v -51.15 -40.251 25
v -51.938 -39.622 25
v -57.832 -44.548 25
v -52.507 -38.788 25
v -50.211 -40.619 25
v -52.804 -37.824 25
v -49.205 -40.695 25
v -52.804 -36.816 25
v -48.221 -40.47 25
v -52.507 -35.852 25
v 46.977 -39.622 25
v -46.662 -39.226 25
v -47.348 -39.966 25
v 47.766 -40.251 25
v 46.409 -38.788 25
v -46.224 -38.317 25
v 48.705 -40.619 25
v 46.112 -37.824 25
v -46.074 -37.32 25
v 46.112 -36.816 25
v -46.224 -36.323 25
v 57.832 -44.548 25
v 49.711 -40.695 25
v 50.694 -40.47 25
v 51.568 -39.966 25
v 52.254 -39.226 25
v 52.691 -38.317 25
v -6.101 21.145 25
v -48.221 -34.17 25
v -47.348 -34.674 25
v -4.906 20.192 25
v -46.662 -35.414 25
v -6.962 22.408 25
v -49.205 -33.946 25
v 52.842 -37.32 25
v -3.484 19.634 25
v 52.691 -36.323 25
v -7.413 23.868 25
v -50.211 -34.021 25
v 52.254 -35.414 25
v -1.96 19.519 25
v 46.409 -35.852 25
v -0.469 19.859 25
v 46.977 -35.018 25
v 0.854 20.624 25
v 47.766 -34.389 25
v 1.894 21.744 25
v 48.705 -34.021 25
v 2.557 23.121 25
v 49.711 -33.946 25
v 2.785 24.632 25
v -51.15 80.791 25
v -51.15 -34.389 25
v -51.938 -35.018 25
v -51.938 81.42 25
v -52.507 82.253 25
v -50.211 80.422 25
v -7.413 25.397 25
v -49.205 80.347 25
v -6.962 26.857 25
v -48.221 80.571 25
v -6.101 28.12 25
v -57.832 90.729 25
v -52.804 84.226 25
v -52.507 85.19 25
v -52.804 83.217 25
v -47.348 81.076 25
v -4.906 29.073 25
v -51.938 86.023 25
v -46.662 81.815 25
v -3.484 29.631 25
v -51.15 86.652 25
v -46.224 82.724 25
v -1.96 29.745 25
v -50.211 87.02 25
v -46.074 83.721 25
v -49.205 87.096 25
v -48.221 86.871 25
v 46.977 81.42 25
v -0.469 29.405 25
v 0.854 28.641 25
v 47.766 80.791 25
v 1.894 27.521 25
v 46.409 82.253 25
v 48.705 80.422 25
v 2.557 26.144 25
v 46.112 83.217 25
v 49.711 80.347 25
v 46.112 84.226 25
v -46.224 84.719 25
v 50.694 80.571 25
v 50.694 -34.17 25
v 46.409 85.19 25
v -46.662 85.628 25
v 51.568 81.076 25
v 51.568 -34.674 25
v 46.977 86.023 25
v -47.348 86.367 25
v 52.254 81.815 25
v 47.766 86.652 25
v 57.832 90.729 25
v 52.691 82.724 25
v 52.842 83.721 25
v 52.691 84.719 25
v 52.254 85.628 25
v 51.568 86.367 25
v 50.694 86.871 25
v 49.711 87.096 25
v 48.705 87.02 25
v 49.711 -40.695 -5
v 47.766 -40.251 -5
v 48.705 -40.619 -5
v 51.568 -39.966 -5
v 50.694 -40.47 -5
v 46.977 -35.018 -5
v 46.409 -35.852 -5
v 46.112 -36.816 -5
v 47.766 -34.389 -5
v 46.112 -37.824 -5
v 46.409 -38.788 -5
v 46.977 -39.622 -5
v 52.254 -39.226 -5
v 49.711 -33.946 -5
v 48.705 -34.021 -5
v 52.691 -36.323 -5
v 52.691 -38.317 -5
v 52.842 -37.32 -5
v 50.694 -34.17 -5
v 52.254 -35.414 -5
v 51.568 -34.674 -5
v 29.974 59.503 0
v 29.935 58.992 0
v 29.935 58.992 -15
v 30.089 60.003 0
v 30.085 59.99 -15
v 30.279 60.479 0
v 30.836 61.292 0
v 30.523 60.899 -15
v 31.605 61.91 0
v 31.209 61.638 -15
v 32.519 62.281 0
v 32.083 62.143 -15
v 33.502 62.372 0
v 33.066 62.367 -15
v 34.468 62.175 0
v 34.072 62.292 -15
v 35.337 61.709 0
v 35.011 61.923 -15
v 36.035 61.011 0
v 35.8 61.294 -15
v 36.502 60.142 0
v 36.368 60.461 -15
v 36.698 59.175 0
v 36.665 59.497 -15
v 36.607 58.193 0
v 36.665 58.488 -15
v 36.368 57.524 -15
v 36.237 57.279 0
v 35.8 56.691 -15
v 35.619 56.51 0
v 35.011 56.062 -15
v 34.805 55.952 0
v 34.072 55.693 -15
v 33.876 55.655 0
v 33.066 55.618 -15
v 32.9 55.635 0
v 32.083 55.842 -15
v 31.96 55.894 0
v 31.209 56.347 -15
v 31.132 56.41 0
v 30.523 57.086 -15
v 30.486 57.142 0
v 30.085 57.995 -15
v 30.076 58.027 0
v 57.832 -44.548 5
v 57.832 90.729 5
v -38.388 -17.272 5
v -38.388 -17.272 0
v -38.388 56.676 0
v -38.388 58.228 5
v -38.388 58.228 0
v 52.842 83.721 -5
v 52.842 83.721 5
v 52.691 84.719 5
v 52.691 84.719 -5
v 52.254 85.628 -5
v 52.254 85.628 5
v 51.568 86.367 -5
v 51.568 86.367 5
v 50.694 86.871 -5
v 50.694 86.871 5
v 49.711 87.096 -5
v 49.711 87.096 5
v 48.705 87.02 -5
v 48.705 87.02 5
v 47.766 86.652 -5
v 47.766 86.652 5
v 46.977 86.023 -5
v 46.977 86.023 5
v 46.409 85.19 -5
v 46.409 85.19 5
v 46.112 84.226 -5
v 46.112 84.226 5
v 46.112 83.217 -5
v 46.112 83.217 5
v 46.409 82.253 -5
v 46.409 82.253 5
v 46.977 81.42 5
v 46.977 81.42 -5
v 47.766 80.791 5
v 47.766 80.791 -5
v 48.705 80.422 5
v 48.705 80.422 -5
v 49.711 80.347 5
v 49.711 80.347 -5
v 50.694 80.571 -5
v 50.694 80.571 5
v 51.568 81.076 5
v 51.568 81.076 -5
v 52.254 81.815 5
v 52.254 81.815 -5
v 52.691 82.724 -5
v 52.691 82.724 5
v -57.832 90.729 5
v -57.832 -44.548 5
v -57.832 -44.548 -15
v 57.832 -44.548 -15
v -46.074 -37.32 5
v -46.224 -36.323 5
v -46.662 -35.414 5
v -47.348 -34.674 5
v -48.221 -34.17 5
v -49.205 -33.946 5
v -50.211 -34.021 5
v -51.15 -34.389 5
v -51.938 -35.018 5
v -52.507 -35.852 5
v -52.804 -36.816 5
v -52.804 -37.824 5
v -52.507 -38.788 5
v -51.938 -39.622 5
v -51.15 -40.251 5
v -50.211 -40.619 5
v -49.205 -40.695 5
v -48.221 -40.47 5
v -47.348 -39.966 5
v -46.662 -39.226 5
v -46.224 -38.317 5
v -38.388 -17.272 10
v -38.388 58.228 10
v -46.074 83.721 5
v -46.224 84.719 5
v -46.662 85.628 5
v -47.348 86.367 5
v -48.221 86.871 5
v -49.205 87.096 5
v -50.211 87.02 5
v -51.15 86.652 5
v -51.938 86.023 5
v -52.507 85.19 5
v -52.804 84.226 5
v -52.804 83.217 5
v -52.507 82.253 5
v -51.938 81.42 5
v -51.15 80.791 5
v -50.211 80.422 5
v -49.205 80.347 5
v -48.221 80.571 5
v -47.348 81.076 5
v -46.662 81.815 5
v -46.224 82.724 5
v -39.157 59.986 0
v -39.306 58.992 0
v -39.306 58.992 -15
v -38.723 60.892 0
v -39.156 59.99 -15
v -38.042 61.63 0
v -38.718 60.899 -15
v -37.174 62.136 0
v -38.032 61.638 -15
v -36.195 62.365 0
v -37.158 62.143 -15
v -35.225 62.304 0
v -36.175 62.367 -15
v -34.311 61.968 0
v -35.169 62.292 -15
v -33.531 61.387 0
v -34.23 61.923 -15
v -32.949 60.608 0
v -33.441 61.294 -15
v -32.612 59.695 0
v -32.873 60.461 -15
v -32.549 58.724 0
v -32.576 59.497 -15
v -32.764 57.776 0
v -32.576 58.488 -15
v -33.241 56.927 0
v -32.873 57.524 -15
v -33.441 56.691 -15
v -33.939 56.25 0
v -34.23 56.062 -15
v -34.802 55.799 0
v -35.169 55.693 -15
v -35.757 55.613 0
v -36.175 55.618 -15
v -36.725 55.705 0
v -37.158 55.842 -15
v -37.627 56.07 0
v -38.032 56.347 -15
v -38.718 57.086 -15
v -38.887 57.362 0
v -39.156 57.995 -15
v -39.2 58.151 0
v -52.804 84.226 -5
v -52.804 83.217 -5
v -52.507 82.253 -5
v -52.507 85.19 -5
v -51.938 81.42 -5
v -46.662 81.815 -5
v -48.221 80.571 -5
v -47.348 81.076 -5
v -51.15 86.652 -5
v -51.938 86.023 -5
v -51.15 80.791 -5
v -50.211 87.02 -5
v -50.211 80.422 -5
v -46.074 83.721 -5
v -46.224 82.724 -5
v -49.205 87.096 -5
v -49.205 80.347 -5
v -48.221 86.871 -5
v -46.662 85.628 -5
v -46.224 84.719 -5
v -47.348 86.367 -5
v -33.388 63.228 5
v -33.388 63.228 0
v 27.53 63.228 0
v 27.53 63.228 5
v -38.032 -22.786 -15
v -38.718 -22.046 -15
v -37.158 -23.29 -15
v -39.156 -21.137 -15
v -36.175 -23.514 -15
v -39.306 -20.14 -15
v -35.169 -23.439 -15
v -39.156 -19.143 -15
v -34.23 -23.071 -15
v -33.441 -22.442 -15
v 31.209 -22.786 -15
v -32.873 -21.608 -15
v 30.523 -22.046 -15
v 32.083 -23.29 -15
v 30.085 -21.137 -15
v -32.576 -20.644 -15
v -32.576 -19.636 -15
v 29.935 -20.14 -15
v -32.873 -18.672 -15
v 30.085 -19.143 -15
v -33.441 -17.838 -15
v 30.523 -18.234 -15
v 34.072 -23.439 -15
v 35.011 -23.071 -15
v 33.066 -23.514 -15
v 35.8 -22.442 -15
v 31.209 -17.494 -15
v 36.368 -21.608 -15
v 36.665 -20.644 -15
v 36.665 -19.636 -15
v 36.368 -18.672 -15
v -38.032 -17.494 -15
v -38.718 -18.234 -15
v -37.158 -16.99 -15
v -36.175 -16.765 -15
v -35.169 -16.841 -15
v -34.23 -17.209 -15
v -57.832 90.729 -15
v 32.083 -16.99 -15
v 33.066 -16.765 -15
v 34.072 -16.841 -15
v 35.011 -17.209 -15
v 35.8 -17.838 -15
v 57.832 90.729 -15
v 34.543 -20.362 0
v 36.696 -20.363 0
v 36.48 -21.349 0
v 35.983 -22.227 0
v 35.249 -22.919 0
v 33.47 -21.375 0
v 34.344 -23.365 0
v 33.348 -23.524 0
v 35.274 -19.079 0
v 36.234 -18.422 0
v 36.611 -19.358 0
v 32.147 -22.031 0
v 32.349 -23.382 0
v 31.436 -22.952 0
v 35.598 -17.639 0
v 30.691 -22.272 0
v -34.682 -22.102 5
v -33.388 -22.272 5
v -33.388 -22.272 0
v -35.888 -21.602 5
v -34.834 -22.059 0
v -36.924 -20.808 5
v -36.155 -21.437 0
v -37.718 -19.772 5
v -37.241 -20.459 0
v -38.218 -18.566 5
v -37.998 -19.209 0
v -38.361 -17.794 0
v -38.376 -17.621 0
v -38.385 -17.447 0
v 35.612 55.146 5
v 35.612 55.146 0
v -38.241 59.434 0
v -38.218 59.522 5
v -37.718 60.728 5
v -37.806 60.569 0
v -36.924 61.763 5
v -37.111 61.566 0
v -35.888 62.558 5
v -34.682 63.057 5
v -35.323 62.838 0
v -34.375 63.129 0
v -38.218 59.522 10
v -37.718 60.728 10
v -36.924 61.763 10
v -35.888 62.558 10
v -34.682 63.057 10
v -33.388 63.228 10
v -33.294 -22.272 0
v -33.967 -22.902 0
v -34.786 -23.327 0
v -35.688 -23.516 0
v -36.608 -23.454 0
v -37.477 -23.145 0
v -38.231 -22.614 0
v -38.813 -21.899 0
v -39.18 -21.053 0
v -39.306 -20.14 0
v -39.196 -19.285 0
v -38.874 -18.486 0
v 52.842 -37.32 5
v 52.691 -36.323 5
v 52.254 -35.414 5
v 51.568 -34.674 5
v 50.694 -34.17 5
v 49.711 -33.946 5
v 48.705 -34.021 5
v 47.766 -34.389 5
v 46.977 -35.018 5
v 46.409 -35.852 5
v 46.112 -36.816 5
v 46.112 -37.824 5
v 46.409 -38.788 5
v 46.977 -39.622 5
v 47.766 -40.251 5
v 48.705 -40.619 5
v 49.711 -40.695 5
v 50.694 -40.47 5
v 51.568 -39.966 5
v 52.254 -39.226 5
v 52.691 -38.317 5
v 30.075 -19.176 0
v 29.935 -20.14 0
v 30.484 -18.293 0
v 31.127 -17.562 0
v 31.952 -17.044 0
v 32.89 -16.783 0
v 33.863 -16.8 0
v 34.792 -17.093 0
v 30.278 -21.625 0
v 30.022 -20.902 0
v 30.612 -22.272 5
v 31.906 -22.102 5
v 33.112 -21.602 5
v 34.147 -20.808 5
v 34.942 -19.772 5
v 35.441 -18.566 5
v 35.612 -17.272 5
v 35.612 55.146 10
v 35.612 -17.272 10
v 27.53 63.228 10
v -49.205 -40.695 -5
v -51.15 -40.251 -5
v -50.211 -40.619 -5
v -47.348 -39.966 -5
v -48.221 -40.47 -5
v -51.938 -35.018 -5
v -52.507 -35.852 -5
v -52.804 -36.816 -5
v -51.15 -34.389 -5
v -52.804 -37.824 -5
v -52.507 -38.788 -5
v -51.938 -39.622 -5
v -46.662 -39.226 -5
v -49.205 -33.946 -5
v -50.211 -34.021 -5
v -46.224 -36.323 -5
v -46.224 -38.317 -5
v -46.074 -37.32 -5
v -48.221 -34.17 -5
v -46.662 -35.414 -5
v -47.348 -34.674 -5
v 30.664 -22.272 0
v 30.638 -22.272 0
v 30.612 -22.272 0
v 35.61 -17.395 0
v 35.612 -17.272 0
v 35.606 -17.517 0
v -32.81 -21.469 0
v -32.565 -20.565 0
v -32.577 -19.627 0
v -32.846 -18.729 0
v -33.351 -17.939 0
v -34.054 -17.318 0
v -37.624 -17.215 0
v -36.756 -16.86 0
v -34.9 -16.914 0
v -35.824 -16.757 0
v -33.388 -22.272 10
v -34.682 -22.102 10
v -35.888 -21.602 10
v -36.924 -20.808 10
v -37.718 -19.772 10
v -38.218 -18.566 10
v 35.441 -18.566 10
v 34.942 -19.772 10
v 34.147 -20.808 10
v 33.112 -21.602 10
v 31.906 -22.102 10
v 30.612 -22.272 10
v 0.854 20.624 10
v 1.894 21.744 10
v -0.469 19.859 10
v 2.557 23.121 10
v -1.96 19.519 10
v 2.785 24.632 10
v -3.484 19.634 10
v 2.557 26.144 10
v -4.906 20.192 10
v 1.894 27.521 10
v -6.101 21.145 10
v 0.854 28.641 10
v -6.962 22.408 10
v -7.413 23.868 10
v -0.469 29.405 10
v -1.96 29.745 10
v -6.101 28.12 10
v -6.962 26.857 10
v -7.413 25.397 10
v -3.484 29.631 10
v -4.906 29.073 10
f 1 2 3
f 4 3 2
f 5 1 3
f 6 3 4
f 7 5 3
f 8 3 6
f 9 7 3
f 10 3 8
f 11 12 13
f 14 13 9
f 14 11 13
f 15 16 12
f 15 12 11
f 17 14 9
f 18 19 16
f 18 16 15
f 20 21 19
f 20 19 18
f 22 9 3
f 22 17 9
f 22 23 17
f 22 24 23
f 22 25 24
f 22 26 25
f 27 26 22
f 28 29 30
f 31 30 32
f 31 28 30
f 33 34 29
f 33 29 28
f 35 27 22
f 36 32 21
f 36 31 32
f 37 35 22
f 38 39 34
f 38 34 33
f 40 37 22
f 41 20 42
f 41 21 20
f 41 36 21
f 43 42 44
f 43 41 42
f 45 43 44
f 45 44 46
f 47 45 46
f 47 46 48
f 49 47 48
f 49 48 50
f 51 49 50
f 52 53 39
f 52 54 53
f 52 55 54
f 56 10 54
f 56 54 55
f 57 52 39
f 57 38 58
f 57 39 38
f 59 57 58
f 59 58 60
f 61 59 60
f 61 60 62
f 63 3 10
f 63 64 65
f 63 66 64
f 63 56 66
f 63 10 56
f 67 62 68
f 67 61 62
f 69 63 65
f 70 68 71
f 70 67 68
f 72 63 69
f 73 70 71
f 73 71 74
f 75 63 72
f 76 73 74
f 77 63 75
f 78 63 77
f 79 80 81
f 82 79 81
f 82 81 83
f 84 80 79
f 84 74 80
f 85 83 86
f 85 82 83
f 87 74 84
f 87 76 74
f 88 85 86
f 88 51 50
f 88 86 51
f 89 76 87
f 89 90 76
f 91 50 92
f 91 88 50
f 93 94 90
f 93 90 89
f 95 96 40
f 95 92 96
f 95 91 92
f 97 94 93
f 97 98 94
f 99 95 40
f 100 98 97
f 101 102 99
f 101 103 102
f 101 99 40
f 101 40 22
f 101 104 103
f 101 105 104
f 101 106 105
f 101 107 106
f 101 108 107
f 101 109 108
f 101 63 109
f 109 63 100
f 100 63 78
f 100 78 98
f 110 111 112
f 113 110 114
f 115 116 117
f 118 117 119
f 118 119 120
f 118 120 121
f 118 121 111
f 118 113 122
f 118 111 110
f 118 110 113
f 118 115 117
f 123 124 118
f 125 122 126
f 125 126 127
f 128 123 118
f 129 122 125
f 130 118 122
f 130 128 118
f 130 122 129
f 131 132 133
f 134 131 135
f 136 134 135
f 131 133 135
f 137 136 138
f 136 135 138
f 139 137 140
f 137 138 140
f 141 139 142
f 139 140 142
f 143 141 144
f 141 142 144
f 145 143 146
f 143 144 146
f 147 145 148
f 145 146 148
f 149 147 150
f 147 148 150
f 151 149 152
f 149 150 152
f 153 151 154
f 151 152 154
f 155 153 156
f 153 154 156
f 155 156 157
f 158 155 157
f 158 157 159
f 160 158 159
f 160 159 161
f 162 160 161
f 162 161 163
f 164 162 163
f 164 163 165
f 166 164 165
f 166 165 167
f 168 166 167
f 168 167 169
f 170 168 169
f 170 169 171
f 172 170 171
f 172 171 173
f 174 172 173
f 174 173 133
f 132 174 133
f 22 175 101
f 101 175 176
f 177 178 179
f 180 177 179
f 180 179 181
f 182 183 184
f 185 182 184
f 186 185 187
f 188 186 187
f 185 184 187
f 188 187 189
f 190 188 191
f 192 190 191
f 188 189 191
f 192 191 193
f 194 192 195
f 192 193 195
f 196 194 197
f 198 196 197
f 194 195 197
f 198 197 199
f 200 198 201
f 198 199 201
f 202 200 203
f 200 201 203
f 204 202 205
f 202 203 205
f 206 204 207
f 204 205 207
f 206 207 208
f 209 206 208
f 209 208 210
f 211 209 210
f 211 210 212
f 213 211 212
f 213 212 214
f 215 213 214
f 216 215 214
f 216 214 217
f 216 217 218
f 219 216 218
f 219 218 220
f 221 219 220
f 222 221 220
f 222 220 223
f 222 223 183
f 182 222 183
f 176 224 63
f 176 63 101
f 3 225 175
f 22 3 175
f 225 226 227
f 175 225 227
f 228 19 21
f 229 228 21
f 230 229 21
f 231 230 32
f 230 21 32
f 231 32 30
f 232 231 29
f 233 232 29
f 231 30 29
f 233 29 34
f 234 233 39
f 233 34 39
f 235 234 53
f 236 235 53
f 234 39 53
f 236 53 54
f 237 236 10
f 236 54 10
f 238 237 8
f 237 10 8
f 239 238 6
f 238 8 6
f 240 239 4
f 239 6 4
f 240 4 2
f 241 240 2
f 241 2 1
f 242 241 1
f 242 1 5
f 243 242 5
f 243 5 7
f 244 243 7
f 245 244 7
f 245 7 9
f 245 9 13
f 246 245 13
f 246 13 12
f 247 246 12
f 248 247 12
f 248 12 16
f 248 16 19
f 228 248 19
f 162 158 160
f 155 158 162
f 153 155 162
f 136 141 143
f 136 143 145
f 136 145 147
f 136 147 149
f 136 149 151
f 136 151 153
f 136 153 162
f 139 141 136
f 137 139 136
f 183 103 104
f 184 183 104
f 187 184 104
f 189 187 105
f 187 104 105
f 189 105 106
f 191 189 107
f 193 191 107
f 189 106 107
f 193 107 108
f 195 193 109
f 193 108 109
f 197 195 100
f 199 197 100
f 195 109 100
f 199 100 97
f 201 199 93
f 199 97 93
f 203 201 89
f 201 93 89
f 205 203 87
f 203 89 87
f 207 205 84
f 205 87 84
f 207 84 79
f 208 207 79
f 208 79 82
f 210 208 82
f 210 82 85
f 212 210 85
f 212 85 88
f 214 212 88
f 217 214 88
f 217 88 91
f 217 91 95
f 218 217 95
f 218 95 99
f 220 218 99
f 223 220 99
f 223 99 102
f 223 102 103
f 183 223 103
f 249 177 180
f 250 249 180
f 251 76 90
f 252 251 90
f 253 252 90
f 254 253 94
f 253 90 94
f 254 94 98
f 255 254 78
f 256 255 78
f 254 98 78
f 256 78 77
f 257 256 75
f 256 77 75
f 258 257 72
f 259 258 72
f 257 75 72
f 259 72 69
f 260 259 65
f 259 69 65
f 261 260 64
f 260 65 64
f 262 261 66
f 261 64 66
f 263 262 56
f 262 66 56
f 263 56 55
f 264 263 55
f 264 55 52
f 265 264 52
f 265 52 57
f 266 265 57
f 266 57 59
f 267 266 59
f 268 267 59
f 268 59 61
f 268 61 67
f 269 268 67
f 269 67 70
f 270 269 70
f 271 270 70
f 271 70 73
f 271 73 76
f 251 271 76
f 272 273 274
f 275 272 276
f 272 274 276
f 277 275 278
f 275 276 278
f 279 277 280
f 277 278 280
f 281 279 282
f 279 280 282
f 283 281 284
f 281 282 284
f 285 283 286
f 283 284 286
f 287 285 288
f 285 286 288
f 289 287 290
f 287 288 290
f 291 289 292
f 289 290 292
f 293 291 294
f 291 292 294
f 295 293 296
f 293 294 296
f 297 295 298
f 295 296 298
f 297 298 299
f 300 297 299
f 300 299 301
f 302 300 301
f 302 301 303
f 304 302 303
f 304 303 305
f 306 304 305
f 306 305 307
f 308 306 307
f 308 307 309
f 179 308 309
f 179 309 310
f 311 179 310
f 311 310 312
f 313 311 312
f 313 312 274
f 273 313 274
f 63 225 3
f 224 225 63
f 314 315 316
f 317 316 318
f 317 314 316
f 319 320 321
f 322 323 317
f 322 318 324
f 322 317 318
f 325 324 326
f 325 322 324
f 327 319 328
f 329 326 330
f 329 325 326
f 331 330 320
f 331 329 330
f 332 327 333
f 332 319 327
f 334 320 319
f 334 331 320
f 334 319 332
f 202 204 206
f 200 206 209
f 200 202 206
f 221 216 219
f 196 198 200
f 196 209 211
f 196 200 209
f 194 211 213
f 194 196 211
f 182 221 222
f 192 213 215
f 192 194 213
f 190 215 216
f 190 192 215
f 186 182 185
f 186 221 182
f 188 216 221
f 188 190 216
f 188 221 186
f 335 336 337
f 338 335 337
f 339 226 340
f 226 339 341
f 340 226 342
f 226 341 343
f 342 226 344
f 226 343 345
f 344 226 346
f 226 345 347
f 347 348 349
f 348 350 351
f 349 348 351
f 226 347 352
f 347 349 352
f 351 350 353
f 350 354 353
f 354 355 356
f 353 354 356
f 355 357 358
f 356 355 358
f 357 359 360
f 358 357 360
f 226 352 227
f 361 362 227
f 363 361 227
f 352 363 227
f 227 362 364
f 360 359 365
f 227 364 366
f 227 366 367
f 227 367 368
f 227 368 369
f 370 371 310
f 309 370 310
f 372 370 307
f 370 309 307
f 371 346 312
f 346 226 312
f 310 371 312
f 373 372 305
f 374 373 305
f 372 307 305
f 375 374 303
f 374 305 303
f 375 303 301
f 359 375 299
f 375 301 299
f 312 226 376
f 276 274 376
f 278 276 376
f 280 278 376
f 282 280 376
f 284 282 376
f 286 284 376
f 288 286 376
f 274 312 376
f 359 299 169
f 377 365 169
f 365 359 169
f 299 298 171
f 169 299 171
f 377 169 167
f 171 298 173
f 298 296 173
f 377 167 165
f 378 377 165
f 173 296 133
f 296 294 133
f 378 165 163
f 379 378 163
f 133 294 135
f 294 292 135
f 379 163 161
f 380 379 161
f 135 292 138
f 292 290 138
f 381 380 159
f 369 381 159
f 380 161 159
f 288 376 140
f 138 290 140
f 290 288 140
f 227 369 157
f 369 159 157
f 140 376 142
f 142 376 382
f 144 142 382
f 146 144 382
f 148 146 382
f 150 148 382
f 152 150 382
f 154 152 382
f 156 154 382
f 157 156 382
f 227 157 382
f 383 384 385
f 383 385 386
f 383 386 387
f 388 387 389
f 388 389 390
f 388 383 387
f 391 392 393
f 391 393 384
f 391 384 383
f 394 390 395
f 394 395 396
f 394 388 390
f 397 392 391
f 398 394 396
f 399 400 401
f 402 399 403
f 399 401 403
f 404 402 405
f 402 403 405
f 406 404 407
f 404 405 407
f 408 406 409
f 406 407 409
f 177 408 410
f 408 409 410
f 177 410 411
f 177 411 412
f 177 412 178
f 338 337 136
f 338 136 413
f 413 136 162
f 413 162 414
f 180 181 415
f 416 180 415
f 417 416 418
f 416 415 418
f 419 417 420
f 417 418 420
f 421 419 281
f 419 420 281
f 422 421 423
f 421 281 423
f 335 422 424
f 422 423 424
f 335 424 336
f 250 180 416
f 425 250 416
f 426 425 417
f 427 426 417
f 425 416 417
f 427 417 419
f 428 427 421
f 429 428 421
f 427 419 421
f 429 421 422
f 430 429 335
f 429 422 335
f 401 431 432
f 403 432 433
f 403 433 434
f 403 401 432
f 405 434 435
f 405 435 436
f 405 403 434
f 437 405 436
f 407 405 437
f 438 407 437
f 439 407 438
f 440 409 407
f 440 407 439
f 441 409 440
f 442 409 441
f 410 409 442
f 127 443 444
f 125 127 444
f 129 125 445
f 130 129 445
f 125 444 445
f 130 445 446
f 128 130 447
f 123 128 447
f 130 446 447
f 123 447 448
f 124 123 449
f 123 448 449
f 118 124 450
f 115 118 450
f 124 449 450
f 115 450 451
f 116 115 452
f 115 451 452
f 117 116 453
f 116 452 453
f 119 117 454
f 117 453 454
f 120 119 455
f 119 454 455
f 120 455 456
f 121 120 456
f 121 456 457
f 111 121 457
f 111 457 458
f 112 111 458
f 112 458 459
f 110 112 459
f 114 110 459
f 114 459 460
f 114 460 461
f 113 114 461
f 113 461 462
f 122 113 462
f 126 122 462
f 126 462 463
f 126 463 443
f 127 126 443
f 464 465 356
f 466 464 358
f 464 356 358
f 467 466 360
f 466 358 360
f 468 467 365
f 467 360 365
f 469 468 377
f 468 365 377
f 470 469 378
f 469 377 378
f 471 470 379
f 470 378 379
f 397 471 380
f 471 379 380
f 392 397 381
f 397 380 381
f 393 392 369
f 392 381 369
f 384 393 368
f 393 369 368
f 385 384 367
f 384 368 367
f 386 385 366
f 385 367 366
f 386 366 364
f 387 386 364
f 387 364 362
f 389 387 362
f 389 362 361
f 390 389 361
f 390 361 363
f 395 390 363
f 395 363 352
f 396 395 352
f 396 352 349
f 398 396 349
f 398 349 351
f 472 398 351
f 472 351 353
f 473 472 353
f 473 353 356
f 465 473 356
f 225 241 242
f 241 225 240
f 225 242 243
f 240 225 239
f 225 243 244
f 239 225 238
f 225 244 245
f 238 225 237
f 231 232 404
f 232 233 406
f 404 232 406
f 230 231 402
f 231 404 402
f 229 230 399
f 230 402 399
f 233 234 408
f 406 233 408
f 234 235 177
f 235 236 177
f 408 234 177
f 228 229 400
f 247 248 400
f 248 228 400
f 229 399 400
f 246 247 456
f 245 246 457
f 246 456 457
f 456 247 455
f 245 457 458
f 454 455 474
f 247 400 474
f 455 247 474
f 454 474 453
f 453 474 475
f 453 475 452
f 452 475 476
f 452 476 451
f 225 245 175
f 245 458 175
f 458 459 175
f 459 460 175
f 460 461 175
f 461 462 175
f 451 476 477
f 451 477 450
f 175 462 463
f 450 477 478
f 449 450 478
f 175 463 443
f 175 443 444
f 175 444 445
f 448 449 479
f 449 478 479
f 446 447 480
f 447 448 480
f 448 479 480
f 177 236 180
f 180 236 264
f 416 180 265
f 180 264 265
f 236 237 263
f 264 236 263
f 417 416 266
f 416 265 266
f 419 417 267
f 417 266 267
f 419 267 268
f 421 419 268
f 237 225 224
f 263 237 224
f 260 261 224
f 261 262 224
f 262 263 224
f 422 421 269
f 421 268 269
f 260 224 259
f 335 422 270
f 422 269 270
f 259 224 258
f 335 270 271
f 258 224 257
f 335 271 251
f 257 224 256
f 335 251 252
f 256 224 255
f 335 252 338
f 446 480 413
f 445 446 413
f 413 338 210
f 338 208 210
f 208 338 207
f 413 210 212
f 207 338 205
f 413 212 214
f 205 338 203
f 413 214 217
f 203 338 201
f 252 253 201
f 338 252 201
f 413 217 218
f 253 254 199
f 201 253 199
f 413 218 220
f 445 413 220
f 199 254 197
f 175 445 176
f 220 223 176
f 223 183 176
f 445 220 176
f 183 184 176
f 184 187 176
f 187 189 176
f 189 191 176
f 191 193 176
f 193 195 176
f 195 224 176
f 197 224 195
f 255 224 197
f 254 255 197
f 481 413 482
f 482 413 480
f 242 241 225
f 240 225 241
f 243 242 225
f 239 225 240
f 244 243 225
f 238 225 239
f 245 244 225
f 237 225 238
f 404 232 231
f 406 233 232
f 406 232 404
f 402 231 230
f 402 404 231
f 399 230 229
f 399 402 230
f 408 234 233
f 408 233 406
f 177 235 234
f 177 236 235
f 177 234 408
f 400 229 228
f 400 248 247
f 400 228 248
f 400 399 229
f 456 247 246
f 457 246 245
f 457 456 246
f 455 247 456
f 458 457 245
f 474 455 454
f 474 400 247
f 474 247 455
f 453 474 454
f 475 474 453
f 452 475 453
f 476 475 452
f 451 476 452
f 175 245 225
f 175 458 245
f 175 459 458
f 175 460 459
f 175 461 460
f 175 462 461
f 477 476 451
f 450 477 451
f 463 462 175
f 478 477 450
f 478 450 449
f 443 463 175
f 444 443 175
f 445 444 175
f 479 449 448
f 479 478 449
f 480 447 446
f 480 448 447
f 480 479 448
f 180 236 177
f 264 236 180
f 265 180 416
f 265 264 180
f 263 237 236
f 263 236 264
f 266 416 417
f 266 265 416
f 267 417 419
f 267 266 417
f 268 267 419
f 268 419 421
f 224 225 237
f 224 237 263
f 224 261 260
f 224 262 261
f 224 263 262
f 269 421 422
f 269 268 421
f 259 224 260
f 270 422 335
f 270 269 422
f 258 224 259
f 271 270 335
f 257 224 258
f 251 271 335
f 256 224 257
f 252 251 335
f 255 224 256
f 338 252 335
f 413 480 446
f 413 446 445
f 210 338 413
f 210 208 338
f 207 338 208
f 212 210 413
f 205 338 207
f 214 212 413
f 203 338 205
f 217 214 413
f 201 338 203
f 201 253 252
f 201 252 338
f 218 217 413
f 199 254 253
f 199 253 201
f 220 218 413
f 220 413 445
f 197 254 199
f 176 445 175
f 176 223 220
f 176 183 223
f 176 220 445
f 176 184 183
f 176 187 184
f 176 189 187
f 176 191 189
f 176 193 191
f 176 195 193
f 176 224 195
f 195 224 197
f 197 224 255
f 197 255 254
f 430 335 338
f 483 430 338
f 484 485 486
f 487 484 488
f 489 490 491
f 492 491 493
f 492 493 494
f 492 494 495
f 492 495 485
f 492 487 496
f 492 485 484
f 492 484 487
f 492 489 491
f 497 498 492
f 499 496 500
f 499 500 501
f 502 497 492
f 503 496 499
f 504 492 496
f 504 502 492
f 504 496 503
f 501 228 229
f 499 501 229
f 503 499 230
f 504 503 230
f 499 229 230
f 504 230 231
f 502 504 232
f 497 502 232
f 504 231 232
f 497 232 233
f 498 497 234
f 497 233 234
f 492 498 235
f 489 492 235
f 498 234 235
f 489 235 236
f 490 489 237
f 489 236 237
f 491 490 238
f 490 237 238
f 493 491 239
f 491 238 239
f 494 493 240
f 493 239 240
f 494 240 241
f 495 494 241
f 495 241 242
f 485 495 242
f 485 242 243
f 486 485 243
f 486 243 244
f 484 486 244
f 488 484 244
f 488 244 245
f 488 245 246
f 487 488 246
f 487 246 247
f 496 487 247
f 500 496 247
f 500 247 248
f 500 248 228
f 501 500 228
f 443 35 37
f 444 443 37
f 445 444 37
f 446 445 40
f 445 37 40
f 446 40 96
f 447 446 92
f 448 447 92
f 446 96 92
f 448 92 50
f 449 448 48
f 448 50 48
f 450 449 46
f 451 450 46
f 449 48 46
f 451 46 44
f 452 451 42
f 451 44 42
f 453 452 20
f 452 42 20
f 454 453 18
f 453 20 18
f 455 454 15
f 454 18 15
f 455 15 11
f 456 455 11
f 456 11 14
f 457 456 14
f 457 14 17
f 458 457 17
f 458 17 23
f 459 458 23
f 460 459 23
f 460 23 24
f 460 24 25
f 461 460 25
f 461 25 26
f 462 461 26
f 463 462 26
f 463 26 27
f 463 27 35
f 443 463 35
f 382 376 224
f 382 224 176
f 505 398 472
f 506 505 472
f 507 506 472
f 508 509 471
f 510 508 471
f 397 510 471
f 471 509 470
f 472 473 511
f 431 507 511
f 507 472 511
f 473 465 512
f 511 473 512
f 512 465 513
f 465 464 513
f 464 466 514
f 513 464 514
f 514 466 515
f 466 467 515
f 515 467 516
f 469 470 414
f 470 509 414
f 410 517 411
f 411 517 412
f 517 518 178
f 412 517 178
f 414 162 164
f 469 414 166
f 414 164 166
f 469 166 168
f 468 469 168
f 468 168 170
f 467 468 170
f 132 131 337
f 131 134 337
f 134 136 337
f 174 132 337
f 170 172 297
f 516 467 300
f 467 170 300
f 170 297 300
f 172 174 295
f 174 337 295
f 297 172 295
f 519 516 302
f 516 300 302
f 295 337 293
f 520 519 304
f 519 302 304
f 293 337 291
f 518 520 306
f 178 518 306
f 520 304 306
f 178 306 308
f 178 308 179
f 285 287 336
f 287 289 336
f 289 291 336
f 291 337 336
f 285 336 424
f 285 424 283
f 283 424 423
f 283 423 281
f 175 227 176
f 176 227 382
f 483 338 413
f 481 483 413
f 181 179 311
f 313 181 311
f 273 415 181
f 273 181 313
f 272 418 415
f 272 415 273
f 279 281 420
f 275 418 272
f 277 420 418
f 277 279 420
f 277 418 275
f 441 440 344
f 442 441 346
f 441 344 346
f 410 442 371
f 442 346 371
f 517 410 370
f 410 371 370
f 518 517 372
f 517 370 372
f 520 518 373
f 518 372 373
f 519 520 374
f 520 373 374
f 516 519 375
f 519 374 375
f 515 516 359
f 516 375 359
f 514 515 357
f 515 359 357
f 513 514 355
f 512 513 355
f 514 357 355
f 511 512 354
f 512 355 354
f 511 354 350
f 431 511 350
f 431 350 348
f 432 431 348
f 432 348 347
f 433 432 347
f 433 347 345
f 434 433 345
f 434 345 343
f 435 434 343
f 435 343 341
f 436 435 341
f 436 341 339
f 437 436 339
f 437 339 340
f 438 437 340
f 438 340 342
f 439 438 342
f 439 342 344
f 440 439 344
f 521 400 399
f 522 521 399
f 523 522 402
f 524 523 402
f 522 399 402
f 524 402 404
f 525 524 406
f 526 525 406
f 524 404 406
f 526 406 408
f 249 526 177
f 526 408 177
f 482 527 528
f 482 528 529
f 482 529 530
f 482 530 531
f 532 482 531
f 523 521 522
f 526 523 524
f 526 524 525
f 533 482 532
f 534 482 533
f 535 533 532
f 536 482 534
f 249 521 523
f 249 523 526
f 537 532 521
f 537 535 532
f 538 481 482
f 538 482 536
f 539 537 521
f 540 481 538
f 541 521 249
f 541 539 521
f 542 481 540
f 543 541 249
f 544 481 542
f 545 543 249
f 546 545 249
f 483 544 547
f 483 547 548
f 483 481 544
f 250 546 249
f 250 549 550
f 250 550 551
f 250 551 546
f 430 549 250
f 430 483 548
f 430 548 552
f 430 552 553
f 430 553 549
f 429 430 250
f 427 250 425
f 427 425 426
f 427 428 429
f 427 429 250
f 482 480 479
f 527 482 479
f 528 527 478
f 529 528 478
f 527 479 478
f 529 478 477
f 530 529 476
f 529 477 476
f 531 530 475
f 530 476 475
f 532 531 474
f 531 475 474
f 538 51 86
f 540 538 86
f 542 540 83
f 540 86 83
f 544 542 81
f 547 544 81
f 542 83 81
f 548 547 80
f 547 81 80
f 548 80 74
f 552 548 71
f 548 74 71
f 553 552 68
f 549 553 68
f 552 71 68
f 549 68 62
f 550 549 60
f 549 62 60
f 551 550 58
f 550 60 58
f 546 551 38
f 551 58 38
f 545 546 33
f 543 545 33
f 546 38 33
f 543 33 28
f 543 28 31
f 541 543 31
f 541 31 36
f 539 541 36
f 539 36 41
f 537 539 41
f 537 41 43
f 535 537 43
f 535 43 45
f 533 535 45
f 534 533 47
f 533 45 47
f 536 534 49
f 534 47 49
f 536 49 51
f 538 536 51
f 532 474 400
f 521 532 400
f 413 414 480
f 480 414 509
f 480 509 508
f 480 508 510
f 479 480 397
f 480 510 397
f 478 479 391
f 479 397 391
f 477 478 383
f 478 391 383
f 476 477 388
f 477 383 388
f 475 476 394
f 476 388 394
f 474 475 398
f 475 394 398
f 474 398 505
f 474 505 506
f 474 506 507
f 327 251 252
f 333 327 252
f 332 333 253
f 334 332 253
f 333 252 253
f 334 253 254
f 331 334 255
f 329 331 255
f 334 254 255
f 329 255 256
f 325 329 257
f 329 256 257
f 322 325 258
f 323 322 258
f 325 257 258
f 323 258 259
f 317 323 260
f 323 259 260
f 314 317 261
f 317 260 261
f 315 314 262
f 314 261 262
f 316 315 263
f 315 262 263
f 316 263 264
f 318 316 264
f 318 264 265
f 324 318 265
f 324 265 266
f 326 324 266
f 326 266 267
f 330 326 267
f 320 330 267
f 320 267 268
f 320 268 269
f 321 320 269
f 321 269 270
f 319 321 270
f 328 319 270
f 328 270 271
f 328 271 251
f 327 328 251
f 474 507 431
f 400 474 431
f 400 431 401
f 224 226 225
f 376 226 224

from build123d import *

# Parameters (mm, degrees)
BOSS_EXTRU_1_DEPTH      = 10
BOSS_EXTRU_3_DEPTH      = 20
BOSS_EXTRU_3_DEPTH_BACK = 20
ESQUISSE3_W             = 115.663264596
ESQUISSE3_H             = 135.276956668
ESQUISSE4_R             = 3.383953379
ENL_V_MAT_EXTRU_1_DEPTH = 30
ESQUISSE5_R             = 5.127396252
ENL_V_MAT_EXTRU_2_DEPTH = 15
ESQUISSE6_R             = 3.383953379
ENL_V_MAT_EXTRU_3_DEPTH = 15


with BuildPart() as part:
    # Esquisse1 → Boss.-Extru.1 (new body)
    with BuildSketch(Plane.XY):
        with BuildLine():
            ThreePointArc((-33.388322981, -22.272236025), (-36.923856887, -20.807769931), (-38.388322981, -17.272236025))
            Line((-38.388322981, -17.272236025), (-38.388322981, 58.227763975))
            ThreePointArc((-38.388322981, 58.227763975), (-36.923856887, 61.763297881), (-33.388322981, 63.227763975))
            Line((-33.388322981, 63.227763975), (27.529505312, 63.227763975))
            Line((27.529505312, 63.227763975), (35.611677019, 55.145592268))
            Line((35.611677019, 55.145592268), (35.611677019, -17.272236025))
            ThreePointArc((35.611677019, -17.272236025), (34.147210925, -20.807769931), (30.611677019, -22.272236025))
            Line((30.611677019, -22.272236025), (-33.388322981, -22.272236025))
        make_face()
    extrude(amount=BOSS_EXTRU_1_DEPTH)


with BuildPart() as body_2:
    # Esquisse3 → Boss.-Extru.3 (new, two sides: drawn at the far end of the back side and taken through both)
    with BuildSketch(Plane.XY.offset(5).offset(-BOSS_EXTRU_3_DEPTH_BACK)):
        with Locations((0, 23.090409061)):
            Rectangle(ESQUISSE3_W, ESQUISSE3_H)
    extrude(amount=BOSS_EXTRU_3_DEPTH + BOSS_EXTRU_3_DEPTH_BACK)

    # Combiner2: cut part
    add(part.part, mode=Mode.SUBTRACT)


with BuildPart() as body_2_2:
    # Fractionner2: the piece on the far side of the plane
    add(body_2.part)
    split(bisect_by=Plane.XY.offset(5), keep=Keep.BOTTOM)


with BuildPart() as body_2_1:
    add(body_2.part)

    # Fractionner2
    split(bisect_by=Plane.XY.offset(5), keep=Keep.TOP)


with BuildPart() as enl_v_mat_extru_1_tool:
    # Esquisse4 → Enlèv. mat.-Extru.1 (new body)
    with BuildSketch(Plane.XY.offset(25)):
        with Locations((-49.457780158, 83.721382539)):
            Circle(ESQUISSE4_R)
        with Locations((49.457780158, 83.721382539)):
            Circle(ESQUISSE4_R)
        with Locations((-49.457780158, -37.320026794)):
            Circle(ESQUISSE4_R)
        with Locations((49.457780158, -37.320026794)):
            Circle(ESQUISSE4_R)
    extrude(amount=-ENL_V_MAT_EXTRU_1_DEPTH)


with BuildPart() as body_2_3:
    add(body_2_1.part)

    # Enlèv. mat.-Extru.1: cut by enl_v_mat_extru_1_tool
    add(enl_v_mat_extru_1_tool.part, mode=Mode.SUBTRACT)

    # Esquisse5 → Enlèv. mat.-Extru.2 (cut)
    with BuildSketch(Plane.XY.offset(25)):
        with Locations((-2.342736955, 24.632350456)):
            Circle(ESQUISSE5_R)
    extrude(amount=-ENL_V_MAT_EXTRU_2_DEPTH, mode=Mode.SUBTRACT)


with BuildPart() as body_2_2_1:
    add(body_2_2.part)

    # Enlèv. mat.-Extru.1: cut by enl_v_mat_extru_1_tool
    add(enl_v_mat_extru_1_tool.part, mode=Mode.SUBTRACT)

    # Esquisse6 → Enlèv. mat.-Extru.3 (cut)
    with BuildSketch(Plane(origin=(0, 0, -15), x_dir=(-1, 0, 0), z_dir=(0, 0, -1))):
        with Locations((-33.31892558, 58.99249246)):
            Circle(ESQUISSE6_R)
        with Locations((35.921966641, 58.99249246)):
            Circle(ESQUISSE6_R)
        with Locations((-33.31892558, -20.139955792)):
            Circle(ESQUISSE6_R)
        with Locations((35.921966641, -20.139955792)):
            Circle(ESQUISSE6_R)
    extrude(amount=-ENL_V_MAT_EXTRU_3_DEPTH, mode=Mode.SUBTRACT)


solid = Compound([body_2_3.part, body_2_2_1.part])
